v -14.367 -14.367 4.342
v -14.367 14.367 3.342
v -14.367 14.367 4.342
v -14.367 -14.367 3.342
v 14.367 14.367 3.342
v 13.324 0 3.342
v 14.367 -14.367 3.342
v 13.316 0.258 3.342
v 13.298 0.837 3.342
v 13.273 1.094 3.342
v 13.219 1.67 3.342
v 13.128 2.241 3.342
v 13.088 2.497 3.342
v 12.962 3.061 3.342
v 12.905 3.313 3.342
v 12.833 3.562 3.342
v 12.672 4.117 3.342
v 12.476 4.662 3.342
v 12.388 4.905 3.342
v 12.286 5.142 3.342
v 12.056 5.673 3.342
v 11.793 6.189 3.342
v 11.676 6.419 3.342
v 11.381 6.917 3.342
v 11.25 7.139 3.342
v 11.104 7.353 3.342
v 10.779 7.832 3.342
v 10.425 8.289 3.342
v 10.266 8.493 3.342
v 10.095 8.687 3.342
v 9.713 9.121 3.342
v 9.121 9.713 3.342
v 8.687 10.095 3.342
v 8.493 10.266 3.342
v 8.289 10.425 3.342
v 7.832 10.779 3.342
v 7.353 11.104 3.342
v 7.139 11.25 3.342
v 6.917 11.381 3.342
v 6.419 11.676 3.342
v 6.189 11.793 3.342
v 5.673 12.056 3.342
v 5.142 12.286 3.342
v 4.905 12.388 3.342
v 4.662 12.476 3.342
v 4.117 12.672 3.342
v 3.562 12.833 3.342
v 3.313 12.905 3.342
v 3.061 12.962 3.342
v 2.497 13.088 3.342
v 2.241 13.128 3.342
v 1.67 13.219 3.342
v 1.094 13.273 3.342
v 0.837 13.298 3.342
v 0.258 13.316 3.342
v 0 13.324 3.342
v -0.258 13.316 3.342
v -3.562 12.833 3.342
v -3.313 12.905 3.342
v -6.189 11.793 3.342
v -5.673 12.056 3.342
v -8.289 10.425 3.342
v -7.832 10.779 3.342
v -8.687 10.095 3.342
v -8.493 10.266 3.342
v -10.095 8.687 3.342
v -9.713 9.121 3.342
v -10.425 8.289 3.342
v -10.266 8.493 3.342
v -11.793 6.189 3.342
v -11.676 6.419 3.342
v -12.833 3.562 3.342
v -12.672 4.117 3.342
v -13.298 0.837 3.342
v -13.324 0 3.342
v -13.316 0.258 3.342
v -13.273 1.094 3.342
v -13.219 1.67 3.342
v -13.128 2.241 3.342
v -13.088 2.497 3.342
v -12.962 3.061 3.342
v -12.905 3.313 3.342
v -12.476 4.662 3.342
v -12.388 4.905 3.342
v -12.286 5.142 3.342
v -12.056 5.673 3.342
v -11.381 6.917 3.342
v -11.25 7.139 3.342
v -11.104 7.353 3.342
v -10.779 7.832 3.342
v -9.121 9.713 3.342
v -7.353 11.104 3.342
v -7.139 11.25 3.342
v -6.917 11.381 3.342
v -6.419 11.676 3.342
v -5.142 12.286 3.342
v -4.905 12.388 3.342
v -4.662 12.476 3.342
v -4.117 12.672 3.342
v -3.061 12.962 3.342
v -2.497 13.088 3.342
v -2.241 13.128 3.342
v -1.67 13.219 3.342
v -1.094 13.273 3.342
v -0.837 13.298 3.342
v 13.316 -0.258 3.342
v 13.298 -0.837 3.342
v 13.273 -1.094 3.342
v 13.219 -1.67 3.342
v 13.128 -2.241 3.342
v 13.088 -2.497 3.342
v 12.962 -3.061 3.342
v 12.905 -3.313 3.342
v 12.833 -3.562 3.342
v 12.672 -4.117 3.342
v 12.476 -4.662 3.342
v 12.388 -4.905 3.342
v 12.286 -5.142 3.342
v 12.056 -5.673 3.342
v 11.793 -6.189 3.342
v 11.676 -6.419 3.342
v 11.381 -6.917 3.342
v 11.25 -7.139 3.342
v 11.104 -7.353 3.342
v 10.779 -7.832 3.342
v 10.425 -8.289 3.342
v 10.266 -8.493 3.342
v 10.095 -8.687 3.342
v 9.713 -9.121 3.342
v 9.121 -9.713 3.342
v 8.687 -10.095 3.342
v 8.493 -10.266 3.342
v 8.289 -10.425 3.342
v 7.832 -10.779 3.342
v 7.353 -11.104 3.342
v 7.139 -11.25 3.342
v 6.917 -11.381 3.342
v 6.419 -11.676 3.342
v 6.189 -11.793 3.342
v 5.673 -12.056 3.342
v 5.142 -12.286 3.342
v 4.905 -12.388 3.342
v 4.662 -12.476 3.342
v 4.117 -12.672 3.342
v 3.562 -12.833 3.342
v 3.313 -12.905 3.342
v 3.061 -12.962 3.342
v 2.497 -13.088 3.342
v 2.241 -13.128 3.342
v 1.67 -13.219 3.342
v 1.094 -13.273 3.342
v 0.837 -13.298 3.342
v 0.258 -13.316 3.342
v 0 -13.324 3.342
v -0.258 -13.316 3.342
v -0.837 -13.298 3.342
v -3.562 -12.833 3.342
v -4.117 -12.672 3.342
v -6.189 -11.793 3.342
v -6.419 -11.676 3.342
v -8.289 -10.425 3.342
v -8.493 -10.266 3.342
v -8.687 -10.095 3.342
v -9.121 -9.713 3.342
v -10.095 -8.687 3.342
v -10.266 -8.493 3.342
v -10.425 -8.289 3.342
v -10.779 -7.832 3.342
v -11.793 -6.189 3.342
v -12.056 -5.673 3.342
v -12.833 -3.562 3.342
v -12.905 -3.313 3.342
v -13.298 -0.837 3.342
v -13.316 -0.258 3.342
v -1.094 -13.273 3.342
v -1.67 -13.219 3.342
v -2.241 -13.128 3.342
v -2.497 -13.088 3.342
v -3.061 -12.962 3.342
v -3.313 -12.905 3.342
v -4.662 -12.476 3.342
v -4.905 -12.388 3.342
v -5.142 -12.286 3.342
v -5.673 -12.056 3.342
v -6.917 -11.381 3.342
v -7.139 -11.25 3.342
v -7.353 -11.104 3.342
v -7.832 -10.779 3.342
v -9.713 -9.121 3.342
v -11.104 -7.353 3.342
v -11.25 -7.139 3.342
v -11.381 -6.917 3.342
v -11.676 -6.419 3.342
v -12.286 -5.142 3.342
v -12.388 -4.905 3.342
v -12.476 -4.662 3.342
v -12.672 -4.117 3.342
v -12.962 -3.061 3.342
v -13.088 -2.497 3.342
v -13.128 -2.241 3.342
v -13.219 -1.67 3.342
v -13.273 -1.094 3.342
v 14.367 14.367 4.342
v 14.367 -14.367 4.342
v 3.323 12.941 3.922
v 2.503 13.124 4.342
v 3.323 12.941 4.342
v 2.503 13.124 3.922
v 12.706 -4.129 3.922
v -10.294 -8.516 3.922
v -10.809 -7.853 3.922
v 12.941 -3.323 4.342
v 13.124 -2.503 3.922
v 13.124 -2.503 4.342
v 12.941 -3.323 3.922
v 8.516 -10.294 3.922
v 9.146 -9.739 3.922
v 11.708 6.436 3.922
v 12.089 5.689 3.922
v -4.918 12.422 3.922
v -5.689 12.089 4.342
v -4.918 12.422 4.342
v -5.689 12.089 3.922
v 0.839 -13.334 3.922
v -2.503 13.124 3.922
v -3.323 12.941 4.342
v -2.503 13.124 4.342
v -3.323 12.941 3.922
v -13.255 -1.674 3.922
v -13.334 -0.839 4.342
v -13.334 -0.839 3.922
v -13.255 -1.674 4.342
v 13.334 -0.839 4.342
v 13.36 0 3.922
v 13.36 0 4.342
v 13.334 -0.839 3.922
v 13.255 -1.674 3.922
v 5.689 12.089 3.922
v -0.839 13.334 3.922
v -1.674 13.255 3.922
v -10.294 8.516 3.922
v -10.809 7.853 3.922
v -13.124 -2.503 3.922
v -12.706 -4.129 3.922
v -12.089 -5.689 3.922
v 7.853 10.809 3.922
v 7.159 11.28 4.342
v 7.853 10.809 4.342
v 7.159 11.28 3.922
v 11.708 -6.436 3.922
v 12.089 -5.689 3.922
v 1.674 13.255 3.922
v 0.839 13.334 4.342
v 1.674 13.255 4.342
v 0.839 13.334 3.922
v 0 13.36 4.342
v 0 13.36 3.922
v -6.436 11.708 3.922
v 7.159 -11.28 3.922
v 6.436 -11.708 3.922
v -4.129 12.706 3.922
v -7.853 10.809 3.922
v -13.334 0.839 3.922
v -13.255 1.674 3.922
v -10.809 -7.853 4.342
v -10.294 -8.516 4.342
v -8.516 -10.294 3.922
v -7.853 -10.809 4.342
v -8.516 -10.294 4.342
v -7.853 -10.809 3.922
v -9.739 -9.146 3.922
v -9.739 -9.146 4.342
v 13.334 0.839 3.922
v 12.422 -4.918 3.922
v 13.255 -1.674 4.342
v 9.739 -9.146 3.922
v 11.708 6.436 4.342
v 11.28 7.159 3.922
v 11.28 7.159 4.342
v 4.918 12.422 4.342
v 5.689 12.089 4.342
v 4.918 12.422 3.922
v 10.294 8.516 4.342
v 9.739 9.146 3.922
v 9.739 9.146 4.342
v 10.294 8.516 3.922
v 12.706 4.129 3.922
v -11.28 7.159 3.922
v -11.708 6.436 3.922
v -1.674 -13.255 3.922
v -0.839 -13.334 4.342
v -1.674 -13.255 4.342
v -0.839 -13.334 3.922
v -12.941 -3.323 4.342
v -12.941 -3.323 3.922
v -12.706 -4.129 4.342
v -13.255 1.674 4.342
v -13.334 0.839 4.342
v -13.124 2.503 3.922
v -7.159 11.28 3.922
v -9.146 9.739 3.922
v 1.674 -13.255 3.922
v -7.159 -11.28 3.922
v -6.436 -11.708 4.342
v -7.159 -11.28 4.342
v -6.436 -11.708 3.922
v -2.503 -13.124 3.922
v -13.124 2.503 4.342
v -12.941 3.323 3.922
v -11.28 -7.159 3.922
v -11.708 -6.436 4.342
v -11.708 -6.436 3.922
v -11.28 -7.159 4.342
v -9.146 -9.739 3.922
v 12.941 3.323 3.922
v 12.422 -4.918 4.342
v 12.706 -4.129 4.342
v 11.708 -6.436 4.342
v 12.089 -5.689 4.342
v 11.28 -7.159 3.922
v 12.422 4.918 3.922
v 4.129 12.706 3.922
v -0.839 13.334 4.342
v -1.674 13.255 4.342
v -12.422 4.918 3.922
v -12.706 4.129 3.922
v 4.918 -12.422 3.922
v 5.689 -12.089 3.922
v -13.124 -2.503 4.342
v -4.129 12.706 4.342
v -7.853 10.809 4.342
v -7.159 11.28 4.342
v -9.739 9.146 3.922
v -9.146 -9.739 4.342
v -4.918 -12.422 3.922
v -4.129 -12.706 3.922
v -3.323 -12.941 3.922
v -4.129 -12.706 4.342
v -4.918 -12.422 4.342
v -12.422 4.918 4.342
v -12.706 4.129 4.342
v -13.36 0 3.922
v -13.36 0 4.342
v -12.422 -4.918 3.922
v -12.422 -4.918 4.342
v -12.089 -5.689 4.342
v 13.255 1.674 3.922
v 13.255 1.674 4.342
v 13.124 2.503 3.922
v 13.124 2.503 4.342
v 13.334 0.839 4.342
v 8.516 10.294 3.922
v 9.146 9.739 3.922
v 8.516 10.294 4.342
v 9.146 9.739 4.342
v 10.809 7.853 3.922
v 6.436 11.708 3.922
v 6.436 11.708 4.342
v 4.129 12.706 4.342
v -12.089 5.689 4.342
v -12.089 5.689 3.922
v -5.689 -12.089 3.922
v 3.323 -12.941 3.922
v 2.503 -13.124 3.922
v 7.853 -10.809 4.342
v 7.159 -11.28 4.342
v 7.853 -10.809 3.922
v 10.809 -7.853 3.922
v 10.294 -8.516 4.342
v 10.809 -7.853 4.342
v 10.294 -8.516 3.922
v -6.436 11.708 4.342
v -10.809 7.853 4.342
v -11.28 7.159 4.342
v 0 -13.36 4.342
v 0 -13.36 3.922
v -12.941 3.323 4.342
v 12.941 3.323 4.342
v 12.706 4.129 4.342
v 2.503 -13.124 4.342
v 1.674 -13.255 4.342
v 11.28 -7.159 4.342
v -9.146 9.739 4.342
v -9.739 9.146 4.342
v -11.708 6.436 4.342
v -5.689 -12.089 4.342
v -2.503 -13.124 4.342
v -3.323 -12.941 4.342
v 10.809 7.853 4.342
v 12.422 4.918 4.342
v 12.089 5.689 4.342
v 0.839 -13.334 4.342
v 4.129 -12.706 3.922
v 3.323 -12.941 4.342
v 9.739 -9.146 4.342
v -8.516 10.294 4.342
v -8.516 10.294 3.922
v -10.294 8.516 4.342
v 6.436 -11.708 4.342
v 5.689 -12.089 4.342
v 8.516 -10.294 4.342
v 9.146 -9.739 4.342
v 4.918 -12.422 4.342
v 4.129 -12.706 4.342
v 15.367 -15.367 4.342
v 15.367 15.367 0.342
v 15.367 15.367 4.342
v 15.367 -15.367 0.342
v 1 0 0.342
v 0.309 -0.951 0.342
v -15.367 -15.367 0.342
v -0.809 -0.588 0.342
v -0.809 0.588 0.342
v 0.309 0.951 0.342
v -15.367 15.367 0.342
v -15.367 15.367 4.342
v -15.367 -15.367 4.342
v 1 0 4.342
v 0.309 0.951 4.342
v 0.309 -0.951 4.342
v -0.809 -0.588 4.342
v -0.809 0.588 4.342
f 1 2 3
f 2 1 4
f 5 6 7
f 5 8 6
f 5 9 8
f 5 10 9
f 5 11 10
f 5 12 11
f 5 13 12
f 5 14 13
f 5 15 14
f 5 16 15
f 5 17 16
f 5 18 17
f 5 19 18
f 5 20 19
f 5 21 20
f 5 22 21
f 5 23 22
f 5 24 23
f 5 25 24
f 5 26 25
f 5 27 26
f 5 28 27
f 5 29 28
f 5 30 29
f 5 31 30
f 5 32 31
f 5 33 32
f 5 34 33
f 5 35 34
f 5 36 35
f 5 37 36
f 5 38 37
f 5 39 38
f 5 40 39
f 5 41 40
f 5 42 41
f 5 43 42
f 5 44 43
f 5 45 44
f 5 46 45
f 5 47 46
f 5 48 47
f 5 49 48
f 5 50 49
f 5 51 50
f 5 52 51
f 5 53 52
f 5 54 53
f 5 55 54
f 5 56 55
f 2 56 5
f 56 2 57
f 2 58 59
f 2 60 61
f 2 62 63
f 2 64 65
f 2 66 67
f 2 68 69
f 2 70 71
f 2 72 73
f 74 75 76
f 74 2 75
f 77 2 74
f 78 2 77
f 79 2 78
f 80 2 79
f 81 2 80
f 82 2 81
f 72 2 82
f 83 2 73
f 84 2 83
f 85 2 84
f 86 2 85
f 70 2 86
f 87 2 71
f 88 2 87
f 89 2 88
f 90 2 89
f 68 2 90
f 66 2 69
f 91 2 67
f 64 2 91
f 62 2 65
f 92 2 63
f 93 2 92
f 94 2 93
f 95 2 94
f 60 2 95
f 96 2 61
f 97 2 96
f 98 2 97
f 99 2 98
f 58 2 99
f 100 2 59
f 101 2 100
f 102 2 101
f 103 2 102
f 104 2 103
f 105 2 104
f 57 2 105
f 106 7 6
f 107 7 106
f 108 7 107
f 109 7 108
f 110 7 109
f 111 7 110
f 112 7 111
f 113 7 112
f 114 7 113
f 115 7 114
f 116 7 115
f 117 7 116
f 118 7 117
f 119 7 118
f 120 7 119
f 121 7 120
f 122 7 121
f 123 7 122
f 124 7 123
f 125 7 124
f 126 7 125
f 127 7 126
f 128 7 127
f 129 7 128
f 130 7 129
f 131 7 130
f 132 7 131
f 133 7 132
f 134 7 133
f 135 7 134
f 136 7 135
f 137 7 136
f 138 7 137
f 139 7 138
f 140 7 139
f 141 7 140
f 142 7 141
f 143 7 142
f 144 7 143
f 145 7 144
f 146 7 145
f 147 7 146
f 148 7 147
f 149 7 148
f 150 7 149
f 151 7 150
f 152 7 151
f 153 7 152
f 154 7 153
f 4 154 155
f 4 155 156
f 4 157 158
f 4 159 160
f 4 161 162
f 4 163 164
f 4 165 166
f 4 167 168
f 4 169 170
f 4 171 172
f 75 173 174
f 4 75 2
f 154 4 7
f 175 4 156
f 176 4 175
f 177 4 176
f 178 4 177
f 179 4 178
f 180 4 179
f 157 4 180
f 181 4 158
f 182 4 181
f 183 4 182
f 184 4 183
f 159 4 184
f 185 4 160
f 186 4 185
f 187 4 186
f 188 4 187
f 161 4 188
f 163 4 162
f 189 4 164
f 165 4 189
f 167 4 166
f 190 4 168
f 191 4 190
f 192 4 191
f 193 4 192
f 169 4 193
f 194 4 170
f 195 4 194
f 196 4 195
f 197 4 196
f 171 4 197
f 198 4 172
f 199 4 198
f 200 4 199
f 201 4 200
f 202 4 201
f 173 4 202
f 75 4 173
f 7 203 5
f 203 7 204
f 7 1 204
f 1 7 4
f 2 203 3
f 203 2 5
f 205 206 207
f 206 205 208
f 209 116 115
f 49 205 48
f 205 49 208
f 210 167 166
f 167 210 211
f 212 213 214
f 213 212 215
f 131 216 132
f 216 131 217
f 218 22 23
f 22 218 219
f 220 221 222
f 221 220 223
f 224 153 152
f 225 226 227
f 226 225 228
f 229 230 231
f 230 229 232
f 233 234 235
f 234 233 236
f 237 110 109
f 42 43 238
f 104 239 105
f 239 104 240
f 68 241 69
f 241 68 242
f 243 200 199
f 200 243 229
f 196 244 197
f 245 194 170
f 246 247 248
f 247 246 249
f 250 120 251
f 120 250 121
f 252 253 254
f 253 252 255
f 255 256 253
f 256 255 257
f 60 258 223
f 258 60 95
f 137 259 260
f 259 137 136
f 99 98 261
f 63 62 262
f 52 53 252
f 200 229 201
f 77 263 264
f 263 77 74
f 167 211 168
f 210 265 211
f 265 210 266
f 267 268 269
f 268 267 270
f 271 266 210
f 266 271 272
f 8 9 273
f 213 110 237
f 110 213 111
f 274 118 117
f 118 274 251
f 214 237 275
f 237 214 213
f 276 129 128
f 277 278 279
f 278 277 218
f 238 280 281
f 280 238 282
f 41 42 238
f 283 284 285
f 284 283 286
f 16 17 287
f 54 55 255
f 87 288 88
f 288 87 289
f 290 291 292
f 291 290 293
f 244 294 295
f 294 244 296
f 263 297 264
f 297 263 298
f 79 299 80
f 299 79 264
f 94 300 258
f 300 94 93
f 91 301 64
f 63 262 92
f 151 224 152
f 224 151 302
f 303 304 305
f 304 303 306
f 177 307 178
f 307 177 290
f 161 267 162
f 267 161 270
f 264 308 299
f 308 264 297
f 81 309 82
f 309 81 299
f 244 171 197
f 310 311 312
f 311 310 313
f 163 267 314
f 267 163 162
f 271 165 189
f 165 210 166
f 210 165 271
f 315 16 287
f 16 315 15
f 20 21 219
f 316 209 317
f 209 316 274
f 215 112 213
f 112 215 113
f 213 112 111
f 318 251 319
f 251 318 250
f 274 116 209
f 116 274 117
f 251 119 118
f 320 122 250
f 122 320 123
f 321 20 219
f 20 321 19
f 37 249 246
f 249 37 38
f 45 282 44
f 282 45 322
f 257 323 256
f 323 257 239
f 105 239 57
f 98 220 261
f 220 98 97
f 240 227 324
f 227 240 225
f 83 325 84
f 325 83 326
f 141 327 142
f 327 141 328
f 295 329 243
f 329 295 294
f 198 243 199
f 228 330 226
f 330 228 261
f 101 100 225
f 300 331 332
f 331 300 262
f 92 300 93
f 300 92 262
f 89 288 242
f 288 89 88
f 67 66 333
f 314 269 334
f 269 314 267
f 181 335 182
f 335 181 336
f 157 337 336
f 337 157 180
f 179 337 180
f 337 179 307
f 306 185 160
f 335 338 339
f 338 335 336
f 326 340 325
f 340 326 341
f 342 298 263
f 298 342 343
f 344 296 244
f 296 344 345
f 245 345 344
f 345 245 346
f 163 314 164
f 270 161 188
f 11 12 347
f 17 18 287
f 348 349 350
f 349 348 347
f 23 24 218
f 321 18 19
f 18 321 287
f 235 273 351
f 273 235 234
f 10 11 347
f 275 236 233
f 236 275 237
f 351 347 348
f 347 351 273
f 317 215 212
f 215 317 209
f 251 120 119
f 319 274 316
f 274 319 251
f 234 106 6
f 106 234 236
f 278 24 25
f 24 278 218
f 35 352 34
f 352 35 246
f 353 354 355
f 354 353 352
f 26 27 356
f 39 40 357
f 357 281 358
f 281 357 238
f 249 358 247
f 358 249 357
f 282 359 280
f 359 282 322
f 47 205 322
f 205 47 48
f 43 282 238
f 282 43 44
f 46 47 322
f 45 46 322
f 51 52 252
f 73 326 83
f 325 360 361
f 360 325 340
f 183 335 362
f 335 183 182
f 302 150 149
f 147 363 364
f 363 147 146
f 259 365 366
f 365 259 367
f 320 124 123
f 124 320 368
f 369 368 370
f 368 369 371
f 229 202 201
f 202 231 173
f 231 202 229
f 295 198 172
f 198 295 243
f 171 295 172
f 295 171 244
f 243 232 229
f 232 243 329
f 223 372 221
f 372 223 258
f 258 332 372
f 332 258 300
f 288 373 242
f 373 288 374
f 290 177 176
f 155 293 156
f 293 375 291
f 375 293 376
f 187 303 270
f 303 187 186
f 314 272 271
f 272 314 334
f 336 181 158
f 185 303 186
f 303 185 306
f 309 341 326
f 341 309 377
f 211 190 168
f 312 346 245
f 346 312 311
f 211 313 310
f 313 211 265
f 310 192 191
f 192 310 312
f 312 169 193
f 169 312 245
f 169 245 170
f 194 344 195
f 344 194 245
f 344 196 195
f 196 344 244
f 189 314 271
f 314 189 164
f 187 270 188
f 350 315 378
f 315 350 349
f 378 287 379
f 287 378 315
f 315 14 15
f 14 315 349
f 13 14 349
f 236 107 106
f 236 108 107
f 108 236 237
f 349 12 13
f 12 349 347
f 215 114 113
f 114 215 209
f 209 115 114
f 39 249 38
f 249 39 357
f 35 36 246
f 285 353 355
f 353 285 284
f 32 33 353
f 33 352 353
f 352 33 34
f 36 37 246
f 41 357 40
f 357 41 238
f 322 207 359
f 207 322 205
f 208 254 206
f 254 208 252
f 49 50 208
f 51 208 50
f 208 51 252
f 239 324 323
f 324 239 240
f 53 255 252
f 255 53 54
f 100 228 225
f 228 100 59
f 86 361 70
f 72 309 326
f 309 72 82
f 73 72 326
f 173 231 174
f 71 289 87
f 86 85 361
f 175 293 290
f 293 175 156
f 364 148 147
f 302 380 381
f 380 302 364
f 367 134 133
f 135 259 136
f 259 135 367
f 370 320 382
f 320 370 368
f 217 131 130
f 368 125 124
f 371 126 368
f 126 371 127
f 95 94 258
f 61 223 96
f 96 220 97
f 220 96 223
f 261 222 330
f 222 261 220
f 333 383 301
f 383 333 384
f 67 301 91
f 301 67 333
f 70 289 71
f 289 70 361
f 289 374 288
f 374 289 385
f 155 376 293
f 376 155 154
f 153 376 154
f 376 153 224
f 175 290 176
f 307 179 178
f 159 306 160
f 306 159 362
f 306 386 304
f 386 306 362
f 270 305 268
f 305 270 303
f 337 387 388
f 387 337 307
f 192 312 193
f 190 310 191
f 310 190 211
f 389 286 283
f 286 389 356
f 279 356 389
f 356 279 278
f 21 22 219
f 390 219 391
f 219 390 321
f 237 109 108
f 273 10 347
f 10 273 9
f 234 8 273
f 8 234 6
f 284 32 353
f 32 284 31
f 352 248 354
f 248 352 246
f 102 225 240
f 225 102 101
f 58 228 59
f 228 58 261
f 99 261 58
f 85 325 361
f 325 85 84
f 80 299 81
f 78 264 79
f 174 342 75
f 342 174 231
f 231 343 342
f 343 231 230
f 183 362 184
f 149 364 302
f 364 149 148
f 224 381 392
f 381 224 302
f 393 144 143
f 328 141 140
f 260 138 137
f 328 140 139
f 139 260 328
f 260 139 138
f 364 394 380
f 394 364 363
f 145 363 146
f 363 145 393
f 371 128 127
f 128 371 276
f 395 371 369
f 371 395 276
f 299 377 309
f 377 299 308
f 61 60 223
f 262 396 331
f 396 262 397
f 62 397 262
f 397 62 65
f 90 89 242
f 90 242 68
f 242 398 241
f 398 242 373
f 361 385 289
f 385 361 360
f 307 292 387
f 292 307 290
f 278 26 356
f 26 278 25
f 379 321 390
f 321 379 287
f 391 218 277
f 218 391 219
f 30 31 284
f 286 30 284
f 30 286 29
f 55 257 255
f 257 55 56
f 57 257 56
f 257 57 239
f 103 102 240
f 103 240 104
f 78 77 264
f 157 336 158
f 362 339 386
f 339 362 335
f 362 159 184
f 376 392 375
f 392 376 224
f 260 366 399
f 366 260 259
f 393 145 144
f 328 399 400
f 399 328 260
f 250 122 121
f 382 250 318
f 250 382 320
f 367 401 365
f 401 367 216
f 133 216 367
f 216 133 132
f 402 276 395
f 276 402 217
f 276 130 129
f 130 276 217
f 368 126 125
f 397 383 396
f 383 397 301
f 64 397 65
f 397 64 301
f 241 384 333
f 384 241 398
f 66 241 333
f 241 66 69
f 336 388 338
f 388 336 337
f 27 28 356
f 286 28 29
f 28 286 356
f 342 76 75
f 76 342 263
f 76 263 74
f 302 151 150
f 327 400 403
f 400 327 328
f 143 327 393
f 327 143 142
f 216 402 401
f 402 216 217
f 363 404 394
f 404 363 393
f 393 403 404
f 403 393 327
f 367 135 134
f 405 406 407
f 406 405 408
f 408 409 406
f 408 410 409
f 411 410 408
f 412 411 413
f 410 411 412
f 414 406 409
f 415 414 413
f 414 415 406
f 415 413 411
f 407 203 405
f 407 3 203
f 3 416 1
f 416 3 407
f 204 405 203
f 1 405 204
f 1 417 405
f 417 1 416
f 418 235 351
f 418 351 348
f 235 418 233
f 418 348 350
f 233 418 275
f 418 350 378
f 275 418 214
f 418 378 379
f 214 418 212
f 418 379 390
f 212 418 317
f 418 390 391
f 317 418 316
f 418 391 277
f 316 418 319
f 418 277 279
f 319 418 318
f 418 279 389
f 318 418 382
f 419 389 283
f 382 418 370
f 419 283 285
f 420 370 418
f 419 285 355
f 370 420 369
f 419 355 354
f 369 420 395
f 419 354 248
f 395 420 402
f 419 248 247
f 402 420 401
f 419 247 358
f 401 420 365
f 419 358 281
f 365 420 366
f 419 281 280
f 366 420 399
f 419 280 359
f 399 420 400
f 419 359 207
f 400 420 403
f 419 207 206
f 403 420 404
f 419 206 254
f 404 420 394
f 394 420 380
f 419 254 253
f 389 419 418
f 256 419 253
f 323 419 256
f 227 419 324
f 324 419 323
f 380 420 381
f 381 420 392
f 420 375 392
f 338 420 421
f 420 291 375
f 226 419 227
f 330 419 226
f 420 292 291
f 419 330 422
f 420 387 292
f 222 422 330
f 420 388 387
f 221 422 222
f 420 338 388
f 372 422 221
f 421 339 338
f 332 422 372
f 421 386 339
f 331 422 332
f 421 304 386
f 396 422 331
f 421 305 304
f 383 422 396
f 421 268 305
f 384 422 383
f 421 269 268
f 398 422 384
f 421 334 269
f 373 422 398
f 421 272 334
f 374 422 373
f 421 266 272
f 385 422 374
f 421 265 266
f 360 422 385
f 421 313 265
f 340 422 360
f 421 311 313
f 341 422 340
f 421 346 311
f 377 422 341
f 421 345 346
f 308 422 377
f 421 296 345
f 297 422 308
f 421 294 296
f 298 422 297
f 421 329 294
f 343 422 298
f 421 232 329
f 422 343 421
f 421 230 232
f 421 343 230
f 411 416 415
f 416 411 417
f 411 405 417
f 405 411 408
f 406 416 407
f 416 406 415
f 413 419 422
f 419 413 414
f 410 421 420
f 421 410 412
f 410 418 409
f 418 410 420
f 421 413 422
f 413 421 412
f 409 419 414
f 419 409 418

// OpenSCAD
// [FL_INDEX: keywords="openscad, 3d_parametric, Lid_for_Half_Sphere_of_Fluid_with_Injection_Hole, csg_solid" | COT="Parametric OpenSCAD design from 3DCodeverse"]
// Title: Lid for Half Sphere of Fluid with Injection Hole

//This script makes a lid with an injection hole for a half sphere depression in a cube - to be used for reactionware testing
// volume sphere is 4/3*pi*r^3 so volume of half sphere=(3*x/(4*3.14))^(1/3)
// area is 4*pi*r^2
//fluid in mL , 1mL=1000mm^3

//Defines the mL of fluid
x=10; 

//Defines the injection hole diameter
i=1;

a=10*pow(3/4*x/3.14, 0.3333);

module reactor()
{
difference (){
#translate([-a-1,-a-1,-1])cube([2*a+2,2*a+2,a+2]);
sphere(r=a, $fn=100);
}
}

module revreactor(){
rotate([0,180,00])reactor();
}


module lid(){ //simple square lid
difference(){
#translate([-a-2,-a-2,0])cube([2*a+4,2*a+4,4]);
revreactor();
}
}

module lidhole(){
difference(){
lid();
cylinder(a,i,i, center=true, $f=100);
}}

rotate([180,0,0])translate([0,0,-a/4-1])lidhole();
